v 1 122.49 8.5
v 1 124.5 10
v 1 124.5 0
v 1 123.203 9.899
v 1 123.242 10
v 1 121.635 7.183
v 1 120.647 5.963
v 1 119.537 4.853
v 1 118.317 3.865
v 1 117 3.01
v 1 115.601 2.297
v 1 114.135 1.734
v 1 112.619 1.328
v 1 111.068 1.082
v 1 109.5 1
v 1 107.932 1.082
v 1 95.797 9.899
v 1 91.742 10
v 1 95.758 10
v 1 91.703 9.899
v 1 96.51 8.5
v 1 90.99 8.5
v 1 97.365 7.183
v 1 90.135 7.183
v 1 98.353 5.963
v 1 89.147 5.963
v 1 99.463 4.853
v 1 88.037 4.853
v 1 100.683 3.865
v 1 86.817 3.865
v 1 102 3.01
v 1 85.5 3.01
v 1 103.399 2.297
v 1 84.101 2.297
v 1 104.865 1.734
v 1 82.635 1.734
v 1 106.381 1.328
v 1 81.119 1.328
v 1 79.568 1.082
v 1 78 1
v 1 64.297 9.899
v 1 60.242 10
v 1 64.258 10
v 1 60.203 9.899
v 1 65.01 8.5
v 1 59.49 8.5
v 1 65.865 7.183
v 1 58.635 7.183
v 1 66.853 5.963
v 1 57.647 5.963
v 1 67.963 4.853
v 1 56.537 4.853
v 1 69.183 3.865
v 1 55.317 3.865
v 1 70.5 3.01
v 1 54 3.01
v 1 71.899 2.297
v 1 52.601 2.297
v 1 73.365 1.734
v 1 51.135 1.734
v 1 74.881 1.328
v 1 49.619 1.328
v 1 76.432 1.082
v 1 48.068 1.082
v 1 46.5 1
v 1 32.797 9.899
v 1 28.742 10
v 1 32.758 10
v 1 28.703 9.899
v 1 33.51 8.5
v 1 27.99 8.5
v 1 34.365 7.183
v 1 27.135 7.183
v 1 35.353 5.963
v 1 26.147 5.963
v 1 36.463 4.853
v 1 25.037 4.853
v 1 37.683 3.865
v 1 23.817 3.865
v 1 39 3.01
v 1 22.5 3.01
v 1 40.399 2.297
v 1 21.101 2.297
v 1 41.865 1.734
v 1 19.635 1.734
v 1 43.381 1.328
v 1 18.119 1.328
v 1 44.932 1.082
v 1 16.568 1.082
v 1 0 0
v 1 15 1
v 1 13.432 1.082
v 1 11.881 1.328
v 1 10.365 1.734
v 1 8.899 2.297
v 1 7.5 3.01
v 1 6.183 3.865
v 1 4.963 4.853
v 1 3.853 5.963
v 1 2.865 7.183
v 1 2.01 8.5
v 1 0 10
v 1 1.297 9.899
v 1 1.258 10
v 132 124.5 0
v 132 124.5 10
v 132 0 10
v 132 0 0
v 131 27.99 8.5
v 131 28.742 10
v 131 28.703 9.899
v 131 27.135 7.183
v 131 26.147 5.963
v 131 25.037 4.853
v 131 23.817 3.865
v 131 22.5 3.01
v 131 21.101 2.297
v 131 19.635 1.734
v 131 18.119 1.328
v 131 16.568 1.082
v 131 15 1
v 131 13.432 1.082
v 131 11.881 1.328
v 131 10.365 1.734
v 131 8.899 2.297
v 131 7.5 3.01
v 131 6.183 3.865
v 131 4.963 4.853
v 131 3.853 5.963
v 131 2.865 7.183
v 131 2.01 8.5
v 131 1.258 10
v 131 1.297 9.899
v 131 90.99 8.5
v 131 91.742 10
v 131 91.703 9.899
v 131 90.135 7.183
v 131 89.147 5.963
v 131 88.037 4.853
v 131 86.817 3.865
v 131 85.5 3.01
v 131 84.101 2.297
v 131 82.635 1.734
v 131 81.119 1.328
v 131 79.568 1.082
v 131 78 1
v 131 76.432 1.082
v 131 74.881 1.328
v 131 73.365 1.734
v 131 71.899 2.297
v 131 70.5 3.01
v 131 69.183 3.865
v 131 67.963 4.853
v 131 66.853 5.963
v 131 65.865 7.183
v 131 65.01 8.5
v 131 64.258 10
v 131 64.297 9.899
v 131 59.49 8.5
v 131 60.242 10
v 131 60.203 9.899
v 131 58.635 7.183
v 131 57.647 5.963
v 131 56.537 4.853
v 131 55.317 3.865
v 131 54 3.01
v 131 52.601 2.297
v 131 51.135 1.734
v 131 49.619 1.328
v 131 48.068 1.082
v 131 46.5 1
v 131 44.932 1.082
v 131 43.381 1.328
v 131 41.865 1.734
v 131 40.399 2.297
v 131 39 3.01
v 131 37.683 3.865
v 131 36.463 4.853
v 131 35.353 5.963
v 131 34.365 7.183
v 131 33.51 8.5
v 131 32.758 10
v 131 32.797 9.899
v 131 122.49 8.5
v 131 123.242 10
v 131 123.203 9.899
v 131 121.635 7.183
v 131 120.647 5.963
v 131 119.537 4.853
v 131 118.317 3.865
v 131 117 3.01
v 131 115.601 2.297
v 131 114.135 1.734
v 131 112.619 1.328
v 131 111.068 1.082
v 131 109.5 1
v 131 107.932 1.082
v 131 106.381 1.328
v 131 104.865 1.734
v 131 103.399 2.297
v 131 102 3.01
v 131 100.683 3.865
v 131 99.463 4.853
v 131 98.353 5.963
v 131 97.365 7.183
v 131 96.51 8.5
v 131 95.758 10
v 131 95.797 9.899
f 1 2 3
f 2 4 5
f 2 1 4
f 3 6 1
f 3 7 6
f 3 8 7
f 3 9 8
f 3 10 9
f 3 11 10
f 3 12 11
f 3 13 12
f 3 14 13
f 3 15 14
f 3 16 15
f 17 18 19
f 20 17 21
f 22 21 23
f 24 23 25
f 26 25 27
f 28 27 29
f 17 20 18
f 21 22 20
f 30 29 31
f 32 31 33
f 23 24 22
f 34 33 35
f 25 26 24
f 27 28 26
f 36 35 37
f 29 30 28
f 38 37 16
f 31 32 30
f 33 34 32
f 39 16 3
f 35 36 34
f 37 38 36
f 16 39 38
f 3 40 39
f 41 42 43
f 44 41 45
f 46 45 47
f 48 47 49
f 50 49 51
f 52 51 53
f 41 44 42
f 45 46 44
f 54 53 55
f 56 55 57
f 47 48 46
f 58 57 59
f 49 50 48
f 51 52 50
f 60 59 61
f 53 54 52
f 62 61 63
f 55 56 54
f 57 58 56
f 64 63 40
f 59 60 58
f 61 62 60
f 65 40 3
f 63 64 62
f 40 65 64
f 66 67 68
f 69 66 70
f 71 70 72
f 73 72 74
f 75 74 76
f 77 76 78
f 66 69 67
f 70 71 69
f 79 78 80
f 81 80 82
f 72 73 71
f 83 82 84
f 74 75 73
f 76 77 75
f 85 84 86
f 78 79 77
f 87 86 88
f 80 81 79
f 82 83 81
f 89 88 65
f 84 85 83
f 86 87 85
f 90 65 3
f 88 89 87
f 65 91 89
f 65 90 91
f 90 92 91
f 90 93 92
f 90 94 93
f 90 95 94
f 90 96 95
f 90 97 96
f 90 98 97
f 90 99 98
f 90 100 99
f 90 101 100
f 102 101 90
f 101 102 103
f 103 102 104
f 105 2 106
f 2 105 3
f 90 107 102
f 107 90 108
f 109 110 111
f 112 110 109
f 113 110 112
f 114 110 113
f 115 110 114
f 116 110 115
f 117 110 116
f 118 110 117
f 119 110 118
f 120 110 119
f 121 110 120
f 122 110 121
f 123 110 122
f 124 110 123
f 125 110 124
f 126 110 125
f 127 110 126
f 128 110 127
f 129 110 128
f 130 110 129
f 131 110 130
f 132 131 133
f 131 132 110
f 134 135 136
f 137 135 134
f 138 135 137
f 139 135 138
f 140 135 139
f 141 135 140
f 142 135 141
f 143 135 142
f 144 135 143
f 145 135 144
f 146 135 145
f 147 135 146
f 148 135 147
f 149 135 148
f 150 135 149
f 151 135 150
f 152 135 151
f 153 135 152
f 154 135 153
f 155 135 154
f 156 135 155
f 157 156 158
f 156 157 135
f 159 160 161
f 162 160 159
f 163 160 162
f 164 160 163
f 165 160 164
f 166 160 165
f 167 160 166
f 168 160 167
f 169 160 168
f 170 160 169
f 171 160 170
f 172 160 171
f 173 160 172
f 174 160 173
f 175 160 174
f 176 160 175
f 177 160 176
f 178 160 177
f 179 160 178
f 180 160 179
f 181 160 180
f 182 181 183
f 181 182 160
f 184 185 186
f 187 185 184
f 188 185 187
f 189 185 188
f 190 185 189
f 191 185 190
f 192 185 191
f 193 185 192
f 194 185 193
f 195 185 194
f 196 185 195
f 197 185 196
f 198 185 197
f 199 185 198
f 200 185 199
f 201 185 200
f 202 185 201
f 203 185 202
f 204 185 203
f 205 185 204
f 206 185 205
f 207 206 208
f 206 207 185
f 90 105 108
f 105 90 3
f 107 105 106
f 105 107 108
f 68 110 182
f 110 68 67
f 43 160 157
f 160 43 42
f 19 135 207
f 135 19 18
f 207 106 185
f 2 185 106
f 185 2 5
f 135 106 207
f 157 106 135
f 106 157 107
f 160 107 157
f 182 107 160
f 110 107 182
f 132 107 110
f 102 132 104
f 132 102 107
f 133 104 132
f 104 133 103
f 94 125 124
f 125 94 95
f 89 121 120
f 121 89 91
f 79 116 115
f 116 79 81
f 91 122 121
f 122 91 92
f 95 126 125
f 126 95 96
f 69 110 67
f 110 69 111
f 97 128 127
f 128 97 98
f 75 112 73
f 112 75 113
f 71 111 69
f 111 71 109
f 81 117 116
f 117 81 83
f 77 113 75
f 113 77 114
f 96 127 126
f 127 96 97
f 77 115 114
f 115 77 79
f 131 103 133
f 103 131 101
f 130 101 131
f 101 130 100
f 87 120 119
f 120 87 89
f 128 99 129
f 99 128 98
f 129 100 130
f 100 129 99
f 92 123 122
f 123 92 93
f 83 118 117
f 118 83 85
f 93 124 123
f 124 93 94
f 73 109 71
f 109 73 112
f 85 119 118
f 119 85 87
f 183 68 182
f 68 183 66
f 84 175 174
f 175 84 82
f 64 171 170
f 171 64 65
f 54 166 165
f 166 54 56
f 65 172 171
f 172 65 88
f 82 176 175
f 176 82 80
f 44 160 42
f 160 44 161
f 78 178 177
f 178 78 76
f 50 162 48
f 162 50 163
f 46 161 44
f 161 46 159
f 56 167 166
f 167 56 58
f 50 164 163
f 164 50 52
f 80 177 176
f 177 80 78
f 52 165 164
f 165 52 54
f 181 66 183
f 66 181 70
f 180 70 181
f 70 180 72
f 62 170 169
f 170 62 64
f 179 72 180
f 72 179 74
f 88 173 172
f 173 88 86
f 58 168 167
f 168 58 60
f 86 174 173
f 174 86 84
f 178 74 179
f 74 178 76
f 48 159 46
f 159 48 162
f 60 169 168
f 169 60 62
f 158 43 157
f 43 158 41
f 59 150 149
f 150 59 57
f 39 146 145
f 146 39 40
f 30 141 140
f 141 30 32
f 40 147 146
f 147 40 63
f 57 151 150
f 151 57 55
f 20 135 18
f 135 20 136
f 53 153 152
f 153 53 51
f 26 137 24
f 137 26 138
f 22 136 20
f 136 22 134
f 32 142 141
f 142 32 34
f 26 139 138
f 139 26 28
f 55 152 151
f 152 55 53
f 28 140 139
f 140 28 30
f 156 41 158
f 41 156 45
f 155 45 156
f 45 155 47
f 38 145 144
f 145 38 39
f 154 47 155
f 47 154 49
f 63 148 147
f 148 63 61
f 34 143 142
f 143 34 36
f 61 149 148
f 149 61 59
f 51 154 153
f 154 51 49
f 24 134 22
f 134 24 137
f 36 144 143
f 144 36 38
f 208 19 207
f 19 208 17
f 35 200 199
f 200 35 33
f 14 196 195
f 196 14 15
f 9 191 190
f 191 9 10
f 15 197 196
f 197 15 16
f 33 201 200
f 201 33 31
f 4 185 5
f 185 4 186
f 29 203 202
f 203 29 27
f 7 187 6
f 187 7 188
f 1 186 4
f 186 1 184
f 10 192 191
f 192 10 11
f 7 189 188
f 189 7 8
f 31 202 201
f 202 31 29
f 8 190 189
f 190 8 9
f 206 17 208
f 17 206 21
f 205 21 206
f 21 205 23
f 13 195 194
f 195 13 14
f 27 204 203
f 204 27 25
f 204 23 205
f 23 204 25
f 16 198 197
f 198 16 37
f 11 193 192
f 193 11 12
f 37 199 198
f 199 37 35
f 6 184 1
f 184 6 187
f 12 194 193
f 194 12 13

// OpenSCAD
// =============================================
// 3D: Horizontal Holder for 4 Bottles (130x30)
// Version: 1.0
// Author: ChatGPT (OpenSCAD)
// =============================================

// ----------------------------
// Настройка точности
// ----------------------------
$fn = 0;        // фиксированную сегментацию отключаем
$fa = 6;        // 5–8° обычно достаточно
$fs = 0.35;     // ≈ диаметр сопла (0.3–0.5 для сопла 0.4)
pin_fs = 0.25;  // для цилиндров высокой точности

// ----------------------------
// Тестовые фрагменты
// ----------------------------
test_fragment = false;  // true — печатать только укороченные фрагменты
frag_size     = 20;     // размер окна вырезки по XY
frag_index    = 0;      // 0=НЛ, 1=ВЛ, 2=НП, 3=ВП (относительно основания)
frag_gap_x    = 10;     // зазор между фрагментами по X, мм
frag_h_extra  = 12;     // запас по высоте клипа, мм

// ----------------------------
// Зазоры/фаски (совместимость)
// ----------------------------
tiny = 0.1;
edge_chamfer_z = 0;      // не используем, но оставим для совместимости
edge_chamfer_x = 0;
edge_chamfer_y = 0;
screen_frame_gap = 0.2;  // не влияет здесь

// ----------------------------
// Параметры модели
// ----------------------------
bottle_diam   = 30;      // диаметр бутылки, мм
bottle_len    = 130;     // длина бутылки по X, мм
num_bottles   = 4;       // количество бутылок в ряду (по Y)
pad_between   = 1.5;     // прокладка/зазор между бутылками (1–2 мм)

// Габариты/толщины
rail_w        = 0;       // боковые рельсы убраны
rail_h        = 6;       // высота рельса по Z, мм
base_th       = 2;       // толщина тонкой базы между рельсами, мм
bridge_th     = 2;       // толщина облегчённых перемычек (мостов), мм
bridge_pitch  = 35;      // шаг перемычек по X, мм
end_stop_h    = 10;       // высота торцевых упоров, мм
end_stop_th   = 1;       // толщина торцевых упоров по X, мм
max_h         = 50;      // ограничение по высоте всей детали, мм

// Вычисляемые размеры
inner_w = num_bottles*bottle_diam + (num_bottles-1)*pad_between;      // рабочая ширина между рельсами
tot_w   = inner_w; // + 2*rail_w;                                          // общая ширина
tot_l   = bottle_len + 2*end_stop_th;                                  // общая длина (с упорами)

// Низкий подпрофиль «ложемента» — высота положительного сегмента
saddle_h = min(max_h - rail_h, bottle_diam/3);                         // не выше трети диаметра
saddle_w = max(bottle_diam/2, 12);                                     // ширина контакта по Y
// Срез по Z сверху на высоте торцевого упора
z_cap  = rail_h + end_stop_h;
// Полная высота модели для переворота по Z
total_h = z_cap;

// Центры бутылок по Y
function bottle_center_y(i) = bottle_diam/2 + i*(bottle_diam + pad_between);

// ----------------------------
// Вспомогательные модули
// ----------------------------
// Режущий цилиндр для выемки (полуканавка) вдоль X, ограниченный по высоте
module saddle_cutter(center_y){
    intersection(){
        // цилиндр вдоль X, начинается после левого упора и заканчивается перед правым
        translate([end_stop_th, center_y, 0])
            rotate([0,90,0])
                cylinder(h=bottle_len, d=bottle_diam, $fs=pin_fs, $fa=6);
        // ограничиваем область выемки только внутренней зоной между рельсами и по Z до z_cap
        translate([end_stop_th, 0, 00])
            cube([bottle_len, inner_w, z_cap], center=false);
    }
}

// Левый/правый рельс
module rail_left(){}
module rail_right(){}

// Облегчённые перемычки по X между рельсами (мосты)
module bridges_light(){
    for(x = [end_stop_th : bridge_pitch : (tot_l - end_stop_th)])
        translate([x, 0, 0]) cube([bridge_th, inner_w, base_th], center=false);
}

// Торцевые упоры по X только между рельсами
module end_stops(){
    // у левого края
    // translate([0, 0, rail_h]) cube([end_stop_th, inner_w, end_stop_h], center=false);
    // у правого края
    translate([tot_l - end_stop_th, rail_w, rail_h]) cube([end_stop_th, inner_w, end_stop_h], center=false);
}

// Объединение всех выемок
module cradle_cuts(){
    for(i = [0 : num_bottles-1])
        saddle_cutter(bottle_center_y(i));
    // Убираем внешние стенки по краям: дополнительные полуканавки за пределами рабочей области
    saddle_cutter(-bottle_diam/2);
    saddle_cutter(inner_w + bottle_diam/2);
}

// Сплошная внутреняя плита между рельсами на высоту выемки (будет облегчена вычитанием цилиндров)
module deck_core(){
    translate([end_stop_th, 0, 0])
        cube([bottle_len, inner_w, z_cap], center=false);
}

// Полная сборка (сырая, без финального среза по Z)
module base_raw(){
    difference(){
        union(){
            // боковые рельсы убраны
            // Тонкие мосты снизу для жёсткости
            bridges_light();
            // Основной объём под выемки
            deck_core();
            end_stops();
        }
        cradle_cuts();
        translate(v = [-10, -10, -z_cap])
          cube([tot_l+20, inner_w+20, 22], center=false);
    }
}

// Срезаем верх по z_cap на всякий случай
module base(){
    base_raw();
}

// ----------------------------
// Клиппер фрагментов
// ----------------------------
module clip_for_fragments(){
    if(test_fragment){
        // Фрагмент у левого торца
        intersection(){
            children();
            translate([-tiny, -tiny, -frag_h_extra])
                cube([frag_size, tot_w + 2*tiny, rail_h + end_stop_h + saddle_h + 2*frag_h_extra], center=false);
        }
        // Фрагмент у правого торца
        translate([frag_size + frag_gap_x, 0, 0])
            intersection(){
                children();
                translate([tot_l - frag_size, -tiny, -frag_h_extra])
                    cube([frag_size + tiny, tot_w + 2*tiny, rail_h + end_stop_h + saddle_h + 2*frag_h_extra], center=false);
            }
    }else{
        children();
    }
}

// Вывод модели
module flipped(){
    // Переворачиваем по Z так, чтобы низ был на Z=0
    translate([0,0,total_h]) mirror([0,0,1]) base();
}

clip_for_fragments() flipped();
